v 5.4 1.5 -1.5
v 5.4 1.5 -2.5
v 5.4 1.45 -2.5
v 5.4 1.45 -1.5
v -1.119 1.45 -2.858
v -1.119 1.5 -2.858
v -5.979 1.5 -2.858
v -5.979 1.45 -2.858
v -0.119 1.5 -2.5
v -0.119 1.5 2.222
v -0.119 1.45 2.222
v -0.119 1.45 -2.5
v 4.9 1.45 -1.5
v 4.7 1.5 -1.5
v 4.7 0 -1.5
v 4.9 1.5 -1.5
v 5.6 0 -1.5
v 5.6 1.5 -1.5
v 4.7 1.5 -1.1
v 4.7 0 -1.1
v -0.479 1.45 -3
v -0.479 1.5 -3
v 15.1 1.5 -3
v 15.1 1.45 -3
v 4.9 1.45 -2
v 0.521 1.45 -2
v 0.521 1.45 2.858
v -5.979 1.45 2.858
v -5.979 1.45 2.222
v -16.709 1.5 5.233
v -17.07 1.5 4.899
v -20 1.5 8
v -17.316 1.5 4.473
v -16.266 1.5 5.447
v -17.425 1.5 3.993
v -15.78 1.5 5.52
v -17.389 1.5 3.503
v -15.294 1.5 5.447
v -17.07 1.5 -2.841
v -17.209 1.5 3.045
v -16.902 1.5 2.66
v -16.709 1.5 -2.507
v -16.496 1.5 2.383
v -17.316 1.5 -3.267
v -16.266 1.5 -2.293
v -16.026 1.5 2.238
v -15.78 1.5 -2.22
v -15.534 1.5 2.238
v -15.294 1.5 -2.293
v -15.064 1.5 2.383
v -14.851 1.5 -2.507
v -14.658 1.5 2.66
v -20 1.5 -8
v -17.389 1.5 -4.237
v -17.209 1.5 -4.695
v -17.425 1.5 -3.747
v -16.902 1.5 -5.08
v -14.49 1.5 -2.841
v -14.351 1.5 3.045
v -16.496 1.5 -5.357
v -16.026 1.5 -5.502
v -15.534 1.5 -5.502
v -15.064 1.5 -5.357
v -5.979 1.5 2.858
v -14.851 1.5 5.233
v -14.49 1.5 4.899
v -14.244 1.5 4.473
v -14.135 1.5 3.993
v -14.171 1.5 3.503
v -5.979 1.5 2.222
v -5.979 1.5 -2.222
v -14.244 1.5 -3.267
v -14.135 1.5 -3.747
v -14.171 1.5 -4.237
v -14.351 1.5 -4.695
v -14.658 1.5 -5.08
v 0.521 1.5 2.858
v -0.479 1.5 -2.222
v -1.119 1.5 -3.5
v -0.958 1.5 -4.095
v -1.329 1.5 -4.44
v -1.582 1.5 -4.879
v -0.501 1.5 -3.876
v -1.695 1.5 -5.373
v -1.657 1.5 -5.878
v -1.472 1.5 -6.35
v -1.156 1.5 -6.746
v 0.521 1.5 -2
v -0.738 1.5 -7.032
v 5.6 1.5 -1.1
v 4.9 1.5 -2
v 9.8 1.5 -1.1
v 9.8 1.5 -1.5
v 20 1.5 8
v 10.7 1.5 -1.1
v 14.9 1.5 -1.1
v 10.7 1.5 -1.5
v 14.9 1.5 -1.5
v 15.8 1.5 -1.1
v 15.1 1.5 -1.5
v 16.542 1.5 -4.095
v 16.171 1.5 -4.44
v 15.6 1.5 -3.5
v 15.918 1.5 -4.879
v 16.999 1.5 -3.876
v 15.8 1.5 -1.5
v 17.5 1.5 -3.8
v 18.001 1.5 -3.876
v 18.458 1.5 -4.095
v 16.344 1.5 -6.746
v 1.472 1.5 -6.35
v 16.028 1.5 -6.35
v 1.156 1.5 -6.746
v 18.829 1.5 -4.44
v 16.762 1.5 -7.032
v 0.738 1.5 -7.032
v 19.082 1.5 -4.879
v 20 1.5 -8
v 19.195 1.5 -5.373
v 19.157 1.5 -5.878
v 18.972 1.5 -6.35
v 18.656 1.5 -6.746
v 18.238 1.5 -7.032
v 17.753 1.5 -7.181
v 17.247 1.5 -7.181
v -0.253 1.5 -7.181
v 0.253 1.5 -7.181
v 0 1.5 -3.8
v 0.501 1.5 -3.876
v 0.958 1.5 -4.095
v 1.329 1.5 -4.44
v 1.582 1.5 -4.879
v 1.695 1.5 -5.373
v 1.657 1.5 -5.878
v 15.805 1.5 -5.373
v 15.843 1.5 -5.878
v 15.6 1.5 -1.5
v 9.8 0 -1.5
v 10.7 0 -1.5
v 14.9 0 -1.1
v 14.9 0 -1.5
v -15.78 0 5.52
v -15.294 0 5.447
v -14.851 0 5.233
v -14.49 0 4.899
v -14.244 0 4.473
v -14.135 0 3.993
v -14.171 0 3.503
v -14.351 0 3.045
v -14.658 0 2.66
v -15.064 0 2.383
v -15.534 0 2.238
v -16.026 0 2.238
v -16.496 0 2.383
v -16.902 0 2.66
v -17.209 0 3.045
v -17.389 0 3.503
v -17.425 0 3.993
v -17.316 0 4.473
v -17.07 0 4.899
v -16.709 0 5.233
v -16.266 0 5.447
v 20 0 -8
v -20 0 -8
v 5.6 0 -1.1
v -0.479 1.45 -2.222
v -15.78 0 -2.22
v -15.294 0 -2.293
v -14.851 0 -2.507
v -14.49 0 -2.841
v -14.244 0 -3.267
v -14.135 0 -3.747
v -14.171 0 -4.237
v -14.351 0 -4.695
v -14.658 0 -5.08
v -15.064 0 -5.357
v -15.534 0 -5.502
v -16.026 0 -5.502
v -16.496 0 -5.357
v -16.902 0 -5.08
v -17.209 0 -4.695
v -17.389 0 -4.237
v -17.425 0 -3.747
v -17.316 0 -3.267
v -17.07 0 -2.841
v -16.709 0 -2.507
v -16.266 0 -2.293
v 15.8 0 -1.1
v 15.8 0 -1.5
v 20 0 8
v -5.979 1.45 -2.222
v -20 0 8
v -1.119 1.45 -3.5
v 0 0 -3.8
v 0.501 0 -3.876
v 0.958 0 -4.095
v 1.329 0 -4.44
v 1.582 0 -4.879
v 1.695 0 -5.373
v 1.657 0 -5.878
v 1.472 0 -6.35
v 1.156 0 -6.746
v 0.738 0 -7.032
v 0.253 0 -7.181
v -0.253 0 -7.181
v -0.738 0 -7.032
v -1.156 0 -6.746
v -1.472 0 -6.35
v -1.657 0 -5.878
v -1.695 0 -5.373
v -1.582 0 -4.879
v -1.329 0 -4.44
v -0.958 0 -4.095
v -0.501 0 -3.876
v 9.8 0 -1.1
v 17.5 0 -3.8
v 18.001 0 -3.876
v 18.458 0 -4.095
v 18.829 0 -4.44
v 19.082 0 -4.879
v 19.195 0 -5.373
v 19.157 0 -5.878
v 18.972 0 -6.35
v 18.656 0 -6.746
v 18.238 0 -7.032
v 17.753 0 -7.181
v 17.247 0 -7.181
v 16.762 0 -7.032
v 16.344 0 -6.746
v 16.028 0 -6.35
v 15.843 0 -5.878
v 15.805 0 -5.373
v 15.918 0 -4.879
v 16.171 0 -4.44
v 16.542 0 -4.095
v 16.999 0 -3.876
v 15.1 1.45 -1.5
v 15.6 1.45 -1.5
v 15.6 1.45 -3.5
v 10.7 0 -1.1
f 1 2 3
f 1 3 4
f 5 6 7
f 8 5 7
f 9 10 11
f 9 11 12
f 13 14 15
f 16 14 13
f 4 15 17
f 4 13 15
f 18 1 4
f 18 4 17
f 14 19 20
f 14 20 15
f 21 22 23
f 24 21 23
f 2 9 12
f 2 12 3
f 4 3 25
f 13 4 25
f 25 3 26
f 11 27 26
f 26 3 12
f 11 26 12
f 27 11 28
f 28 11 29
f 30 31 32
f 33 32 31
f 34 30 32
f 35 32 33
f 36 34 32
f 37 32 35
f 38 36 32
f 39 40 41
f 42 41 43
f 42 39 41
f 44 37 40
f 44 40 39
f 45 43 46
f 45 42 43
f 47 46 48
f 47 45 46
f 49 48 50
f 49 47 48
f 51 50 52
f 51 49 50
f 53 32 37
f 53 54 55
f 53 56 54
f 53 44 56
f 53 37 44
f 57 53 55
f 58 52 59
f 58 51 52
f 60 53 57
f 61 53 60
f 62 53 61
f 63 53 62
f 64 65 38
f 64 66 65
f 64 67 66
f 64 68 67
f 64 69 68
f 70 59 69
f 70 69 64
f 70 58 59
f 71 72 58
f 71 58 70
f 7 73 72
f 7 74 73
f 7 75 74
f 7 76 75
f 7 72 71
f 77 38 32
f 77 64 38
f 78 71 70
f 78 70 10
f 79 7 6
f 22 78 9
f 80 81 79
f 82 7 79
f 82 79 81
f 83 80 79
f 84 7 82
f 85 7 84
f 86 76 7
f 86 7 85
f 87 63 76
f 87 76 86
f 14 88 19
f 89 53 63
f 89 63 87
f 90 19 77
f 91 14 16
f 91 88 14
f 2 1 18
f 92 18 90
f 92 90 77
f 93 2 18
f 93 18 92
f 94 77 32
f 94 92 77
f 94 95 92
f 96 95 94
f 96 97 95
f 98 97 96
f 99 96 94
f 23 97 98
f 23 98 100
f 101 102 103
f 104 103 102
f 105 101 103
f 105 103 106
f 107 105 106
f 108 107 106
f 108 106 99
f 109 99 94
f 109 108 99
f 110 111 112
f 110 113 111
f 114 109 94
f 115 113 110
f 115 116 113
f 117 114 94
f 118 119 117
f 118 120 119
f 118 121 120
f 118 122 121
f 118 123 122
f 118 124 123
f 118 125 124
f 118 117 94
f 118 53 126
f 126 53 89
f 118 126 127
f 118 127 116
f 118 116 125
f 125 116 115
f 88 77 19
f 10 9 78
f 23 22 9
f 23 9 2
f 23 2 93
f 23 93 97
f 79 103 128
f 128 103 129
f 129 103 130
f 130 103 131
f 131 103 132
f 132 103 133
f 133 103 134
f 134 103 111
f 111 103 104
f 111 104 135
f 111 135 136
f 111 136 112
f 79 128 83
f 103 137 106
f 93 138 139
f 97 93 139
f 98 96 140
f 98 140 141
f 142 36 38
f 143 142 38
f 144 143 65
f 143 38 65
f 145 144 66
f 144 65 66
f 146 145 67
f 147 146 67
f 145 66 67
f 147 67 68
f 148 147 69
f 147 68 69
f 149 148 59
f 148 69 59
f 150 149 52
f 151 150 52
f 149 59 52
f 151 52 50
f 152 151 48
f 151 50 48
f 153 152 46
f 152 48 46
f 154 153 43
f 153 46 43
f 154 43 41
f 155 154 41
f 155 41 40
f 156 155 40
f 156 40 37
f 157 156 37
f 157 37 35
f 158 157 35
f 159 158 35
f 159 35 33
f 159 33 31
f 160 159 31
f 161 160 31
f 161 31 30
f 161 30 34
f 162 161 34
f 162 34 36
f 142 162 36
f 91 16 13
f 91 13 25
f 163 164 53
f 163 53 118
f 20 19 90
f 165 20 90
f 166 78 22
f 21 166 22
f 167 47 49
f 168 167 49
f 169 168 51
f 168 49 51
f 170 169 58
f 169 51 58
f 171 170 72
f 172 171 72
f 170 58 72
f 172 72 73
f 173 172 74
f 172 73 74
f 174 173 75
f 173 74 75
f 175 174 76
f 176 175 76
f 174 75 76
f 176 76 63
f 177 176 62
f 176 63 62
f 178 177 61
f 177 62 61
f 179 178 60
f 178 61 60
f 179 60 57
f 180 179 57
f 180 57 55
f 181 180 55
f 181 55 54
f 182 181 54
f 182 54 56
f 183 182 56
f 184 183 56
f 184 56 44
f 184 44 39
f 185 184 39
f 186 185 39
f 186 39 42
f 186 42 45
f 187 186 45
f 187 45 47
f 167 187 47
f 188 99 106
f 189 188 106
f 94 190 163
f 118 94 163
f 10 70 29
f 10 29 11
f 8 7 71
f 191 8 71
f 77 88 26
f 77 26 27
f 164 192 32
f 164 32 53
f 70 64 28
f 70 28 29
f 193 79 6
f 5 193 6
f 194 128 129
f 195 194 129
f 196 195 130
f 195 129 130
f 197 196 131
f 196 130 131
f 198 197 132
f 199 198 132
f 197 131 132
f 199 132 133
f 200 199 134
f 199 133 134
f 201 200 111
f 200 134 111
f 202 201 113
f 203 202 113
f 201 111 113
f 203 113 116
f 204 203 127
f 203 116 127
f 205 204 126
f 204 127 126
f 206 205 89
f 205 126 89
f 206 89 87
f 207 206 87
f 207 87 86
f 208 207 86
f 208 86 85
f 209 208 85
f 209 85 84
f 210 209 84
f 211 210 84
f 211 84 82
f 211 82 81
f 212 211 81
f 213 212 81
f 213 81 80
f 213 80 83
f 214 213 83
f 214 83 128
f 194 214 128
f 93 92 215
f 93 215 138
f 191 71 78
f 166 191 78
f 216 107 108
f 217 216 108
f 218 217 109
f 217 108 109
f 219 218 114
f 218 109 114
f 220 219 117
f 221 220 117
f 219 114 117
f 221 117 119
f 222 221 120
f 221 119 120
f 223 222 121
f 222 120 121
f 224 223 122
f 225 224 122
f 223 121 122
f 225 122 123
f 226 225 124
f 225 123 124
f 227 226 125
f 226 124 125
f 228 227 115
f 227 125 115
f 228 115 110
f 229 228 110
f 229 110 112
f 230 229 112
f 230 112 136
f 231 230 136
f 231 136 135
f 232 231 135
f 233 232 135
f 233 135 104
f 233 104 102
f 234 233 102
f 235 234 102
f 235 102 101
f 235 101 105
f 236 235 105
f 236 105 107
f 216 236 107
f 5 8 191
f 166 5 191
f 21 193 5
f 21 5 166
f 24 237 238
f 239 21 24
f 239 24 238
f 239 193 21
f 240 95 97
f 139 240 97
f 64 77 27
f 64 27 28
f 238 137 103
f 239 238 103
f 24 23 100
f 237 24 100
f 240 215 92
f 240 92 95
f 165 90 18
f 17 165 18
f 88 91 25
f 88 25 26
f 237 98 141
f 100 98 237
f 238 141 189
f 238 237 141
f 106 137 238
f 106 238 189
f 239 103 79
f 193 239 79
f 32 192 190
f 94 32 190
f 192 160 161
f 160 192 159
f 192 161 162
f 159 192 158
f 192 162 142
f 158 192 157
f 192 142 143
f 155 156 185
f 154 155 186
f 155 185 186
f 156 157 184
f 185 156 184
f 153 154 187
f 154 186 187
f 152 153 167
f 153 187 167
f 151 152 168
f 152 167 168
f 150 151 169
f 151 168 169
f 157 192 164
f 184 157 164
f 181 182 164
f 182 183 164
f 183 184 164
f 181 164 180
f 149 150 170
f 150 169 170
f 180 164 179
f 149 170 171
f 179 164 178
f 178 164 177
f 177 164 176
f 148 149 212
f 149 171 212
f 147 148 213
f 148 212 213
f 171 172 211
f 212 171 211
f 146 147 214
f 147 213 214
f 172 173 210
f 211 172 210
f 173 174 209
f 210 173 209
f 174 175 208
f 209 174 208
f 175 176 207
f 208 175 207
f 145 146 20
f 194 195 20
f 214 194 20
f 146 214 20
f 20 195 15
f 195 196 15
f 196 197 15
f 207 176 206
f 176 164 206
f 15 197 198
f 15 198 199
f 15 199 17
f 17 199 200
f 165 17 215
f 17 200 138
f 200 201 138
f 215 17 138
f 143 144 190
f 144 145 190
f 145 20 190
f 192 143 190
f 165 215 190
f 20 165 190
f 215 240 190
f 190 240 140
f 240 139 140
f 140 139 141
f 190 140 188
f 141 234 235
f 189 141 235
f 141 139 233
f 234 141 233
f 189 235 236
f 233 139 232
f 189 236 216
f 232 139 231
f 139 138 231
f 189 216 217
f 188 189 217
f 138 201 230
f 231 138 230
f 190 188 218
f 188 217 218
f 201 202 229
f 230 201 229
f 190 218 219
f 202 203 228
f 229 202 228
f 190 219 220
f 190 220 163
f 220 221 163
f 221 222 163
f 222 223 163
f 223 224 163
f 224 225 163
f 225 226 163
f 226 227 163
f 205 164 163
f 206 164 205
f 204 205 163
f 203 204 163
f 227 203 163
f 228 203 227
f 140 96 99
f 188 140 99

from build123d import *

# Parameters (mm, degrees)
SKETCH1_W           = 40
SKETCH1_H           = 16
BOSS_EXTRUDE1_DEPTH = 1.5
SKETCH2_R           = 1.7
CUT_EXTRUDE1_DEPTH  = 22.592822882
SKETCH3_W           = 0.9
SKETCH3_H           = 0.4
CUT_EXTRUDE2_DEPTH  = 22.592822882
SKETCH5_R           = 1.65
CUT_EXTRUDE4_DEPTH  = 22.592822882
CUT_EXTRUDE5_DEPTH  = 0.05


with BuildPart() as part:
    # Sketch1 → Boss-Extrude1 (new body)
    with BuildSketch(Plane(origin=(0, 0, 0), x_dir=(1, 0, 0), z_dir=(0, 1, 0))):
        Rectangle(SKETCH1_W, SKETCH1_H)
    extrude(amount=BOSS_EXTRUDE1_DEPTH)

    # Sketch2 → Cut-Extrude1 (cut, through all)
    with BuildSketch(Plane(origin=(0, 1.5, 0), x_dir=(1, 0, 0), z_dir=(0, 1, 0))):
        with Locations(Location((0, 5.5, 0), (0, 0, 270))):
            Circle(SKETCH2_R)
        with Locations(Location((17.5, 5.5, 0), (0, 0, 270))):
            Circle(SKETCH2_R)
    extrude(amount=-CUT_EXTRUDE1_DEPTH, mode=Mode.SUBTRACT)

    # Sketch3 → Cut-Extrude2 (cut, through all)
    with BuildSketch(Plane(origin=(0, 1.5, 0), x_dir=(1, 0, 0), z_dir=(0, 1, 0))):
        with Locations((15.35, 1.3)):
            Rectangle(SKETCH3_W, SKETCH3_H)
        with Locations((5.15, 1.3)):
            Rectangle(SKETCH3_W, SKETCH3_H)
        with Locations((10.25, 1.3)):
            Rectangle(SKETCH3_W, SKETCH3_H)
    extrude(amount=-CUT_EXTRUDE2_DEPTH, mode=Mode.SUBTRACT)

    # Sketch5 → Cut-Extrude4 (cut, through all)
    with BuildSketch(Plane(origin=(0, 1.5, 0), x_dir=(1, 0, 0), z_dir=(0, 1, 0))):
        with Locations(Location((-15.78, 3.87, 0), (0, 0, 270))):
            Circle(SKETCH5_R)
        with Locations(Location((-15.78, -3.87, 0), (0, 0, 270))):
            Circle(SKETCH5_R)
    extrude(amount=-CUT_EXTRUDE4_DEPTH, mode=Mode.SUBTRACT)

    # Sketch6 → Cut-Extrude5 (cut)
    with BuildSketch(Plane(origin=(0, 1.5, 0), x_dir=(1, 0, 0), z_dir=(0, 1, 0))):
        Polygon((4.9, 1.5), (4.9, 2), (0.5208, 2), (0.5208, -2.8575), (-5.9792, -2.8575), (-5.9792, -2.2225), (-0.1192, -2.2225), (-0.1192, 2.5), (5.4, 2.5), (5.4, 1.5), align=None)
        Polygon((-5.9792, 2.8575), (-5.9792, 2.2225), (-0.4792, 2.2225), (-0.4792, 3), (15.1, 3), (15.1, 1.5), (15.6, 1.5), (15.6, 3.5), (-1.1192, 3.5), (-1.1192, 2.8575), align=None)
    extrude(amount=-CUT_EXTRUDE5_DEPTH, mode=Mode.SUBTRACT)


solid = part.part
